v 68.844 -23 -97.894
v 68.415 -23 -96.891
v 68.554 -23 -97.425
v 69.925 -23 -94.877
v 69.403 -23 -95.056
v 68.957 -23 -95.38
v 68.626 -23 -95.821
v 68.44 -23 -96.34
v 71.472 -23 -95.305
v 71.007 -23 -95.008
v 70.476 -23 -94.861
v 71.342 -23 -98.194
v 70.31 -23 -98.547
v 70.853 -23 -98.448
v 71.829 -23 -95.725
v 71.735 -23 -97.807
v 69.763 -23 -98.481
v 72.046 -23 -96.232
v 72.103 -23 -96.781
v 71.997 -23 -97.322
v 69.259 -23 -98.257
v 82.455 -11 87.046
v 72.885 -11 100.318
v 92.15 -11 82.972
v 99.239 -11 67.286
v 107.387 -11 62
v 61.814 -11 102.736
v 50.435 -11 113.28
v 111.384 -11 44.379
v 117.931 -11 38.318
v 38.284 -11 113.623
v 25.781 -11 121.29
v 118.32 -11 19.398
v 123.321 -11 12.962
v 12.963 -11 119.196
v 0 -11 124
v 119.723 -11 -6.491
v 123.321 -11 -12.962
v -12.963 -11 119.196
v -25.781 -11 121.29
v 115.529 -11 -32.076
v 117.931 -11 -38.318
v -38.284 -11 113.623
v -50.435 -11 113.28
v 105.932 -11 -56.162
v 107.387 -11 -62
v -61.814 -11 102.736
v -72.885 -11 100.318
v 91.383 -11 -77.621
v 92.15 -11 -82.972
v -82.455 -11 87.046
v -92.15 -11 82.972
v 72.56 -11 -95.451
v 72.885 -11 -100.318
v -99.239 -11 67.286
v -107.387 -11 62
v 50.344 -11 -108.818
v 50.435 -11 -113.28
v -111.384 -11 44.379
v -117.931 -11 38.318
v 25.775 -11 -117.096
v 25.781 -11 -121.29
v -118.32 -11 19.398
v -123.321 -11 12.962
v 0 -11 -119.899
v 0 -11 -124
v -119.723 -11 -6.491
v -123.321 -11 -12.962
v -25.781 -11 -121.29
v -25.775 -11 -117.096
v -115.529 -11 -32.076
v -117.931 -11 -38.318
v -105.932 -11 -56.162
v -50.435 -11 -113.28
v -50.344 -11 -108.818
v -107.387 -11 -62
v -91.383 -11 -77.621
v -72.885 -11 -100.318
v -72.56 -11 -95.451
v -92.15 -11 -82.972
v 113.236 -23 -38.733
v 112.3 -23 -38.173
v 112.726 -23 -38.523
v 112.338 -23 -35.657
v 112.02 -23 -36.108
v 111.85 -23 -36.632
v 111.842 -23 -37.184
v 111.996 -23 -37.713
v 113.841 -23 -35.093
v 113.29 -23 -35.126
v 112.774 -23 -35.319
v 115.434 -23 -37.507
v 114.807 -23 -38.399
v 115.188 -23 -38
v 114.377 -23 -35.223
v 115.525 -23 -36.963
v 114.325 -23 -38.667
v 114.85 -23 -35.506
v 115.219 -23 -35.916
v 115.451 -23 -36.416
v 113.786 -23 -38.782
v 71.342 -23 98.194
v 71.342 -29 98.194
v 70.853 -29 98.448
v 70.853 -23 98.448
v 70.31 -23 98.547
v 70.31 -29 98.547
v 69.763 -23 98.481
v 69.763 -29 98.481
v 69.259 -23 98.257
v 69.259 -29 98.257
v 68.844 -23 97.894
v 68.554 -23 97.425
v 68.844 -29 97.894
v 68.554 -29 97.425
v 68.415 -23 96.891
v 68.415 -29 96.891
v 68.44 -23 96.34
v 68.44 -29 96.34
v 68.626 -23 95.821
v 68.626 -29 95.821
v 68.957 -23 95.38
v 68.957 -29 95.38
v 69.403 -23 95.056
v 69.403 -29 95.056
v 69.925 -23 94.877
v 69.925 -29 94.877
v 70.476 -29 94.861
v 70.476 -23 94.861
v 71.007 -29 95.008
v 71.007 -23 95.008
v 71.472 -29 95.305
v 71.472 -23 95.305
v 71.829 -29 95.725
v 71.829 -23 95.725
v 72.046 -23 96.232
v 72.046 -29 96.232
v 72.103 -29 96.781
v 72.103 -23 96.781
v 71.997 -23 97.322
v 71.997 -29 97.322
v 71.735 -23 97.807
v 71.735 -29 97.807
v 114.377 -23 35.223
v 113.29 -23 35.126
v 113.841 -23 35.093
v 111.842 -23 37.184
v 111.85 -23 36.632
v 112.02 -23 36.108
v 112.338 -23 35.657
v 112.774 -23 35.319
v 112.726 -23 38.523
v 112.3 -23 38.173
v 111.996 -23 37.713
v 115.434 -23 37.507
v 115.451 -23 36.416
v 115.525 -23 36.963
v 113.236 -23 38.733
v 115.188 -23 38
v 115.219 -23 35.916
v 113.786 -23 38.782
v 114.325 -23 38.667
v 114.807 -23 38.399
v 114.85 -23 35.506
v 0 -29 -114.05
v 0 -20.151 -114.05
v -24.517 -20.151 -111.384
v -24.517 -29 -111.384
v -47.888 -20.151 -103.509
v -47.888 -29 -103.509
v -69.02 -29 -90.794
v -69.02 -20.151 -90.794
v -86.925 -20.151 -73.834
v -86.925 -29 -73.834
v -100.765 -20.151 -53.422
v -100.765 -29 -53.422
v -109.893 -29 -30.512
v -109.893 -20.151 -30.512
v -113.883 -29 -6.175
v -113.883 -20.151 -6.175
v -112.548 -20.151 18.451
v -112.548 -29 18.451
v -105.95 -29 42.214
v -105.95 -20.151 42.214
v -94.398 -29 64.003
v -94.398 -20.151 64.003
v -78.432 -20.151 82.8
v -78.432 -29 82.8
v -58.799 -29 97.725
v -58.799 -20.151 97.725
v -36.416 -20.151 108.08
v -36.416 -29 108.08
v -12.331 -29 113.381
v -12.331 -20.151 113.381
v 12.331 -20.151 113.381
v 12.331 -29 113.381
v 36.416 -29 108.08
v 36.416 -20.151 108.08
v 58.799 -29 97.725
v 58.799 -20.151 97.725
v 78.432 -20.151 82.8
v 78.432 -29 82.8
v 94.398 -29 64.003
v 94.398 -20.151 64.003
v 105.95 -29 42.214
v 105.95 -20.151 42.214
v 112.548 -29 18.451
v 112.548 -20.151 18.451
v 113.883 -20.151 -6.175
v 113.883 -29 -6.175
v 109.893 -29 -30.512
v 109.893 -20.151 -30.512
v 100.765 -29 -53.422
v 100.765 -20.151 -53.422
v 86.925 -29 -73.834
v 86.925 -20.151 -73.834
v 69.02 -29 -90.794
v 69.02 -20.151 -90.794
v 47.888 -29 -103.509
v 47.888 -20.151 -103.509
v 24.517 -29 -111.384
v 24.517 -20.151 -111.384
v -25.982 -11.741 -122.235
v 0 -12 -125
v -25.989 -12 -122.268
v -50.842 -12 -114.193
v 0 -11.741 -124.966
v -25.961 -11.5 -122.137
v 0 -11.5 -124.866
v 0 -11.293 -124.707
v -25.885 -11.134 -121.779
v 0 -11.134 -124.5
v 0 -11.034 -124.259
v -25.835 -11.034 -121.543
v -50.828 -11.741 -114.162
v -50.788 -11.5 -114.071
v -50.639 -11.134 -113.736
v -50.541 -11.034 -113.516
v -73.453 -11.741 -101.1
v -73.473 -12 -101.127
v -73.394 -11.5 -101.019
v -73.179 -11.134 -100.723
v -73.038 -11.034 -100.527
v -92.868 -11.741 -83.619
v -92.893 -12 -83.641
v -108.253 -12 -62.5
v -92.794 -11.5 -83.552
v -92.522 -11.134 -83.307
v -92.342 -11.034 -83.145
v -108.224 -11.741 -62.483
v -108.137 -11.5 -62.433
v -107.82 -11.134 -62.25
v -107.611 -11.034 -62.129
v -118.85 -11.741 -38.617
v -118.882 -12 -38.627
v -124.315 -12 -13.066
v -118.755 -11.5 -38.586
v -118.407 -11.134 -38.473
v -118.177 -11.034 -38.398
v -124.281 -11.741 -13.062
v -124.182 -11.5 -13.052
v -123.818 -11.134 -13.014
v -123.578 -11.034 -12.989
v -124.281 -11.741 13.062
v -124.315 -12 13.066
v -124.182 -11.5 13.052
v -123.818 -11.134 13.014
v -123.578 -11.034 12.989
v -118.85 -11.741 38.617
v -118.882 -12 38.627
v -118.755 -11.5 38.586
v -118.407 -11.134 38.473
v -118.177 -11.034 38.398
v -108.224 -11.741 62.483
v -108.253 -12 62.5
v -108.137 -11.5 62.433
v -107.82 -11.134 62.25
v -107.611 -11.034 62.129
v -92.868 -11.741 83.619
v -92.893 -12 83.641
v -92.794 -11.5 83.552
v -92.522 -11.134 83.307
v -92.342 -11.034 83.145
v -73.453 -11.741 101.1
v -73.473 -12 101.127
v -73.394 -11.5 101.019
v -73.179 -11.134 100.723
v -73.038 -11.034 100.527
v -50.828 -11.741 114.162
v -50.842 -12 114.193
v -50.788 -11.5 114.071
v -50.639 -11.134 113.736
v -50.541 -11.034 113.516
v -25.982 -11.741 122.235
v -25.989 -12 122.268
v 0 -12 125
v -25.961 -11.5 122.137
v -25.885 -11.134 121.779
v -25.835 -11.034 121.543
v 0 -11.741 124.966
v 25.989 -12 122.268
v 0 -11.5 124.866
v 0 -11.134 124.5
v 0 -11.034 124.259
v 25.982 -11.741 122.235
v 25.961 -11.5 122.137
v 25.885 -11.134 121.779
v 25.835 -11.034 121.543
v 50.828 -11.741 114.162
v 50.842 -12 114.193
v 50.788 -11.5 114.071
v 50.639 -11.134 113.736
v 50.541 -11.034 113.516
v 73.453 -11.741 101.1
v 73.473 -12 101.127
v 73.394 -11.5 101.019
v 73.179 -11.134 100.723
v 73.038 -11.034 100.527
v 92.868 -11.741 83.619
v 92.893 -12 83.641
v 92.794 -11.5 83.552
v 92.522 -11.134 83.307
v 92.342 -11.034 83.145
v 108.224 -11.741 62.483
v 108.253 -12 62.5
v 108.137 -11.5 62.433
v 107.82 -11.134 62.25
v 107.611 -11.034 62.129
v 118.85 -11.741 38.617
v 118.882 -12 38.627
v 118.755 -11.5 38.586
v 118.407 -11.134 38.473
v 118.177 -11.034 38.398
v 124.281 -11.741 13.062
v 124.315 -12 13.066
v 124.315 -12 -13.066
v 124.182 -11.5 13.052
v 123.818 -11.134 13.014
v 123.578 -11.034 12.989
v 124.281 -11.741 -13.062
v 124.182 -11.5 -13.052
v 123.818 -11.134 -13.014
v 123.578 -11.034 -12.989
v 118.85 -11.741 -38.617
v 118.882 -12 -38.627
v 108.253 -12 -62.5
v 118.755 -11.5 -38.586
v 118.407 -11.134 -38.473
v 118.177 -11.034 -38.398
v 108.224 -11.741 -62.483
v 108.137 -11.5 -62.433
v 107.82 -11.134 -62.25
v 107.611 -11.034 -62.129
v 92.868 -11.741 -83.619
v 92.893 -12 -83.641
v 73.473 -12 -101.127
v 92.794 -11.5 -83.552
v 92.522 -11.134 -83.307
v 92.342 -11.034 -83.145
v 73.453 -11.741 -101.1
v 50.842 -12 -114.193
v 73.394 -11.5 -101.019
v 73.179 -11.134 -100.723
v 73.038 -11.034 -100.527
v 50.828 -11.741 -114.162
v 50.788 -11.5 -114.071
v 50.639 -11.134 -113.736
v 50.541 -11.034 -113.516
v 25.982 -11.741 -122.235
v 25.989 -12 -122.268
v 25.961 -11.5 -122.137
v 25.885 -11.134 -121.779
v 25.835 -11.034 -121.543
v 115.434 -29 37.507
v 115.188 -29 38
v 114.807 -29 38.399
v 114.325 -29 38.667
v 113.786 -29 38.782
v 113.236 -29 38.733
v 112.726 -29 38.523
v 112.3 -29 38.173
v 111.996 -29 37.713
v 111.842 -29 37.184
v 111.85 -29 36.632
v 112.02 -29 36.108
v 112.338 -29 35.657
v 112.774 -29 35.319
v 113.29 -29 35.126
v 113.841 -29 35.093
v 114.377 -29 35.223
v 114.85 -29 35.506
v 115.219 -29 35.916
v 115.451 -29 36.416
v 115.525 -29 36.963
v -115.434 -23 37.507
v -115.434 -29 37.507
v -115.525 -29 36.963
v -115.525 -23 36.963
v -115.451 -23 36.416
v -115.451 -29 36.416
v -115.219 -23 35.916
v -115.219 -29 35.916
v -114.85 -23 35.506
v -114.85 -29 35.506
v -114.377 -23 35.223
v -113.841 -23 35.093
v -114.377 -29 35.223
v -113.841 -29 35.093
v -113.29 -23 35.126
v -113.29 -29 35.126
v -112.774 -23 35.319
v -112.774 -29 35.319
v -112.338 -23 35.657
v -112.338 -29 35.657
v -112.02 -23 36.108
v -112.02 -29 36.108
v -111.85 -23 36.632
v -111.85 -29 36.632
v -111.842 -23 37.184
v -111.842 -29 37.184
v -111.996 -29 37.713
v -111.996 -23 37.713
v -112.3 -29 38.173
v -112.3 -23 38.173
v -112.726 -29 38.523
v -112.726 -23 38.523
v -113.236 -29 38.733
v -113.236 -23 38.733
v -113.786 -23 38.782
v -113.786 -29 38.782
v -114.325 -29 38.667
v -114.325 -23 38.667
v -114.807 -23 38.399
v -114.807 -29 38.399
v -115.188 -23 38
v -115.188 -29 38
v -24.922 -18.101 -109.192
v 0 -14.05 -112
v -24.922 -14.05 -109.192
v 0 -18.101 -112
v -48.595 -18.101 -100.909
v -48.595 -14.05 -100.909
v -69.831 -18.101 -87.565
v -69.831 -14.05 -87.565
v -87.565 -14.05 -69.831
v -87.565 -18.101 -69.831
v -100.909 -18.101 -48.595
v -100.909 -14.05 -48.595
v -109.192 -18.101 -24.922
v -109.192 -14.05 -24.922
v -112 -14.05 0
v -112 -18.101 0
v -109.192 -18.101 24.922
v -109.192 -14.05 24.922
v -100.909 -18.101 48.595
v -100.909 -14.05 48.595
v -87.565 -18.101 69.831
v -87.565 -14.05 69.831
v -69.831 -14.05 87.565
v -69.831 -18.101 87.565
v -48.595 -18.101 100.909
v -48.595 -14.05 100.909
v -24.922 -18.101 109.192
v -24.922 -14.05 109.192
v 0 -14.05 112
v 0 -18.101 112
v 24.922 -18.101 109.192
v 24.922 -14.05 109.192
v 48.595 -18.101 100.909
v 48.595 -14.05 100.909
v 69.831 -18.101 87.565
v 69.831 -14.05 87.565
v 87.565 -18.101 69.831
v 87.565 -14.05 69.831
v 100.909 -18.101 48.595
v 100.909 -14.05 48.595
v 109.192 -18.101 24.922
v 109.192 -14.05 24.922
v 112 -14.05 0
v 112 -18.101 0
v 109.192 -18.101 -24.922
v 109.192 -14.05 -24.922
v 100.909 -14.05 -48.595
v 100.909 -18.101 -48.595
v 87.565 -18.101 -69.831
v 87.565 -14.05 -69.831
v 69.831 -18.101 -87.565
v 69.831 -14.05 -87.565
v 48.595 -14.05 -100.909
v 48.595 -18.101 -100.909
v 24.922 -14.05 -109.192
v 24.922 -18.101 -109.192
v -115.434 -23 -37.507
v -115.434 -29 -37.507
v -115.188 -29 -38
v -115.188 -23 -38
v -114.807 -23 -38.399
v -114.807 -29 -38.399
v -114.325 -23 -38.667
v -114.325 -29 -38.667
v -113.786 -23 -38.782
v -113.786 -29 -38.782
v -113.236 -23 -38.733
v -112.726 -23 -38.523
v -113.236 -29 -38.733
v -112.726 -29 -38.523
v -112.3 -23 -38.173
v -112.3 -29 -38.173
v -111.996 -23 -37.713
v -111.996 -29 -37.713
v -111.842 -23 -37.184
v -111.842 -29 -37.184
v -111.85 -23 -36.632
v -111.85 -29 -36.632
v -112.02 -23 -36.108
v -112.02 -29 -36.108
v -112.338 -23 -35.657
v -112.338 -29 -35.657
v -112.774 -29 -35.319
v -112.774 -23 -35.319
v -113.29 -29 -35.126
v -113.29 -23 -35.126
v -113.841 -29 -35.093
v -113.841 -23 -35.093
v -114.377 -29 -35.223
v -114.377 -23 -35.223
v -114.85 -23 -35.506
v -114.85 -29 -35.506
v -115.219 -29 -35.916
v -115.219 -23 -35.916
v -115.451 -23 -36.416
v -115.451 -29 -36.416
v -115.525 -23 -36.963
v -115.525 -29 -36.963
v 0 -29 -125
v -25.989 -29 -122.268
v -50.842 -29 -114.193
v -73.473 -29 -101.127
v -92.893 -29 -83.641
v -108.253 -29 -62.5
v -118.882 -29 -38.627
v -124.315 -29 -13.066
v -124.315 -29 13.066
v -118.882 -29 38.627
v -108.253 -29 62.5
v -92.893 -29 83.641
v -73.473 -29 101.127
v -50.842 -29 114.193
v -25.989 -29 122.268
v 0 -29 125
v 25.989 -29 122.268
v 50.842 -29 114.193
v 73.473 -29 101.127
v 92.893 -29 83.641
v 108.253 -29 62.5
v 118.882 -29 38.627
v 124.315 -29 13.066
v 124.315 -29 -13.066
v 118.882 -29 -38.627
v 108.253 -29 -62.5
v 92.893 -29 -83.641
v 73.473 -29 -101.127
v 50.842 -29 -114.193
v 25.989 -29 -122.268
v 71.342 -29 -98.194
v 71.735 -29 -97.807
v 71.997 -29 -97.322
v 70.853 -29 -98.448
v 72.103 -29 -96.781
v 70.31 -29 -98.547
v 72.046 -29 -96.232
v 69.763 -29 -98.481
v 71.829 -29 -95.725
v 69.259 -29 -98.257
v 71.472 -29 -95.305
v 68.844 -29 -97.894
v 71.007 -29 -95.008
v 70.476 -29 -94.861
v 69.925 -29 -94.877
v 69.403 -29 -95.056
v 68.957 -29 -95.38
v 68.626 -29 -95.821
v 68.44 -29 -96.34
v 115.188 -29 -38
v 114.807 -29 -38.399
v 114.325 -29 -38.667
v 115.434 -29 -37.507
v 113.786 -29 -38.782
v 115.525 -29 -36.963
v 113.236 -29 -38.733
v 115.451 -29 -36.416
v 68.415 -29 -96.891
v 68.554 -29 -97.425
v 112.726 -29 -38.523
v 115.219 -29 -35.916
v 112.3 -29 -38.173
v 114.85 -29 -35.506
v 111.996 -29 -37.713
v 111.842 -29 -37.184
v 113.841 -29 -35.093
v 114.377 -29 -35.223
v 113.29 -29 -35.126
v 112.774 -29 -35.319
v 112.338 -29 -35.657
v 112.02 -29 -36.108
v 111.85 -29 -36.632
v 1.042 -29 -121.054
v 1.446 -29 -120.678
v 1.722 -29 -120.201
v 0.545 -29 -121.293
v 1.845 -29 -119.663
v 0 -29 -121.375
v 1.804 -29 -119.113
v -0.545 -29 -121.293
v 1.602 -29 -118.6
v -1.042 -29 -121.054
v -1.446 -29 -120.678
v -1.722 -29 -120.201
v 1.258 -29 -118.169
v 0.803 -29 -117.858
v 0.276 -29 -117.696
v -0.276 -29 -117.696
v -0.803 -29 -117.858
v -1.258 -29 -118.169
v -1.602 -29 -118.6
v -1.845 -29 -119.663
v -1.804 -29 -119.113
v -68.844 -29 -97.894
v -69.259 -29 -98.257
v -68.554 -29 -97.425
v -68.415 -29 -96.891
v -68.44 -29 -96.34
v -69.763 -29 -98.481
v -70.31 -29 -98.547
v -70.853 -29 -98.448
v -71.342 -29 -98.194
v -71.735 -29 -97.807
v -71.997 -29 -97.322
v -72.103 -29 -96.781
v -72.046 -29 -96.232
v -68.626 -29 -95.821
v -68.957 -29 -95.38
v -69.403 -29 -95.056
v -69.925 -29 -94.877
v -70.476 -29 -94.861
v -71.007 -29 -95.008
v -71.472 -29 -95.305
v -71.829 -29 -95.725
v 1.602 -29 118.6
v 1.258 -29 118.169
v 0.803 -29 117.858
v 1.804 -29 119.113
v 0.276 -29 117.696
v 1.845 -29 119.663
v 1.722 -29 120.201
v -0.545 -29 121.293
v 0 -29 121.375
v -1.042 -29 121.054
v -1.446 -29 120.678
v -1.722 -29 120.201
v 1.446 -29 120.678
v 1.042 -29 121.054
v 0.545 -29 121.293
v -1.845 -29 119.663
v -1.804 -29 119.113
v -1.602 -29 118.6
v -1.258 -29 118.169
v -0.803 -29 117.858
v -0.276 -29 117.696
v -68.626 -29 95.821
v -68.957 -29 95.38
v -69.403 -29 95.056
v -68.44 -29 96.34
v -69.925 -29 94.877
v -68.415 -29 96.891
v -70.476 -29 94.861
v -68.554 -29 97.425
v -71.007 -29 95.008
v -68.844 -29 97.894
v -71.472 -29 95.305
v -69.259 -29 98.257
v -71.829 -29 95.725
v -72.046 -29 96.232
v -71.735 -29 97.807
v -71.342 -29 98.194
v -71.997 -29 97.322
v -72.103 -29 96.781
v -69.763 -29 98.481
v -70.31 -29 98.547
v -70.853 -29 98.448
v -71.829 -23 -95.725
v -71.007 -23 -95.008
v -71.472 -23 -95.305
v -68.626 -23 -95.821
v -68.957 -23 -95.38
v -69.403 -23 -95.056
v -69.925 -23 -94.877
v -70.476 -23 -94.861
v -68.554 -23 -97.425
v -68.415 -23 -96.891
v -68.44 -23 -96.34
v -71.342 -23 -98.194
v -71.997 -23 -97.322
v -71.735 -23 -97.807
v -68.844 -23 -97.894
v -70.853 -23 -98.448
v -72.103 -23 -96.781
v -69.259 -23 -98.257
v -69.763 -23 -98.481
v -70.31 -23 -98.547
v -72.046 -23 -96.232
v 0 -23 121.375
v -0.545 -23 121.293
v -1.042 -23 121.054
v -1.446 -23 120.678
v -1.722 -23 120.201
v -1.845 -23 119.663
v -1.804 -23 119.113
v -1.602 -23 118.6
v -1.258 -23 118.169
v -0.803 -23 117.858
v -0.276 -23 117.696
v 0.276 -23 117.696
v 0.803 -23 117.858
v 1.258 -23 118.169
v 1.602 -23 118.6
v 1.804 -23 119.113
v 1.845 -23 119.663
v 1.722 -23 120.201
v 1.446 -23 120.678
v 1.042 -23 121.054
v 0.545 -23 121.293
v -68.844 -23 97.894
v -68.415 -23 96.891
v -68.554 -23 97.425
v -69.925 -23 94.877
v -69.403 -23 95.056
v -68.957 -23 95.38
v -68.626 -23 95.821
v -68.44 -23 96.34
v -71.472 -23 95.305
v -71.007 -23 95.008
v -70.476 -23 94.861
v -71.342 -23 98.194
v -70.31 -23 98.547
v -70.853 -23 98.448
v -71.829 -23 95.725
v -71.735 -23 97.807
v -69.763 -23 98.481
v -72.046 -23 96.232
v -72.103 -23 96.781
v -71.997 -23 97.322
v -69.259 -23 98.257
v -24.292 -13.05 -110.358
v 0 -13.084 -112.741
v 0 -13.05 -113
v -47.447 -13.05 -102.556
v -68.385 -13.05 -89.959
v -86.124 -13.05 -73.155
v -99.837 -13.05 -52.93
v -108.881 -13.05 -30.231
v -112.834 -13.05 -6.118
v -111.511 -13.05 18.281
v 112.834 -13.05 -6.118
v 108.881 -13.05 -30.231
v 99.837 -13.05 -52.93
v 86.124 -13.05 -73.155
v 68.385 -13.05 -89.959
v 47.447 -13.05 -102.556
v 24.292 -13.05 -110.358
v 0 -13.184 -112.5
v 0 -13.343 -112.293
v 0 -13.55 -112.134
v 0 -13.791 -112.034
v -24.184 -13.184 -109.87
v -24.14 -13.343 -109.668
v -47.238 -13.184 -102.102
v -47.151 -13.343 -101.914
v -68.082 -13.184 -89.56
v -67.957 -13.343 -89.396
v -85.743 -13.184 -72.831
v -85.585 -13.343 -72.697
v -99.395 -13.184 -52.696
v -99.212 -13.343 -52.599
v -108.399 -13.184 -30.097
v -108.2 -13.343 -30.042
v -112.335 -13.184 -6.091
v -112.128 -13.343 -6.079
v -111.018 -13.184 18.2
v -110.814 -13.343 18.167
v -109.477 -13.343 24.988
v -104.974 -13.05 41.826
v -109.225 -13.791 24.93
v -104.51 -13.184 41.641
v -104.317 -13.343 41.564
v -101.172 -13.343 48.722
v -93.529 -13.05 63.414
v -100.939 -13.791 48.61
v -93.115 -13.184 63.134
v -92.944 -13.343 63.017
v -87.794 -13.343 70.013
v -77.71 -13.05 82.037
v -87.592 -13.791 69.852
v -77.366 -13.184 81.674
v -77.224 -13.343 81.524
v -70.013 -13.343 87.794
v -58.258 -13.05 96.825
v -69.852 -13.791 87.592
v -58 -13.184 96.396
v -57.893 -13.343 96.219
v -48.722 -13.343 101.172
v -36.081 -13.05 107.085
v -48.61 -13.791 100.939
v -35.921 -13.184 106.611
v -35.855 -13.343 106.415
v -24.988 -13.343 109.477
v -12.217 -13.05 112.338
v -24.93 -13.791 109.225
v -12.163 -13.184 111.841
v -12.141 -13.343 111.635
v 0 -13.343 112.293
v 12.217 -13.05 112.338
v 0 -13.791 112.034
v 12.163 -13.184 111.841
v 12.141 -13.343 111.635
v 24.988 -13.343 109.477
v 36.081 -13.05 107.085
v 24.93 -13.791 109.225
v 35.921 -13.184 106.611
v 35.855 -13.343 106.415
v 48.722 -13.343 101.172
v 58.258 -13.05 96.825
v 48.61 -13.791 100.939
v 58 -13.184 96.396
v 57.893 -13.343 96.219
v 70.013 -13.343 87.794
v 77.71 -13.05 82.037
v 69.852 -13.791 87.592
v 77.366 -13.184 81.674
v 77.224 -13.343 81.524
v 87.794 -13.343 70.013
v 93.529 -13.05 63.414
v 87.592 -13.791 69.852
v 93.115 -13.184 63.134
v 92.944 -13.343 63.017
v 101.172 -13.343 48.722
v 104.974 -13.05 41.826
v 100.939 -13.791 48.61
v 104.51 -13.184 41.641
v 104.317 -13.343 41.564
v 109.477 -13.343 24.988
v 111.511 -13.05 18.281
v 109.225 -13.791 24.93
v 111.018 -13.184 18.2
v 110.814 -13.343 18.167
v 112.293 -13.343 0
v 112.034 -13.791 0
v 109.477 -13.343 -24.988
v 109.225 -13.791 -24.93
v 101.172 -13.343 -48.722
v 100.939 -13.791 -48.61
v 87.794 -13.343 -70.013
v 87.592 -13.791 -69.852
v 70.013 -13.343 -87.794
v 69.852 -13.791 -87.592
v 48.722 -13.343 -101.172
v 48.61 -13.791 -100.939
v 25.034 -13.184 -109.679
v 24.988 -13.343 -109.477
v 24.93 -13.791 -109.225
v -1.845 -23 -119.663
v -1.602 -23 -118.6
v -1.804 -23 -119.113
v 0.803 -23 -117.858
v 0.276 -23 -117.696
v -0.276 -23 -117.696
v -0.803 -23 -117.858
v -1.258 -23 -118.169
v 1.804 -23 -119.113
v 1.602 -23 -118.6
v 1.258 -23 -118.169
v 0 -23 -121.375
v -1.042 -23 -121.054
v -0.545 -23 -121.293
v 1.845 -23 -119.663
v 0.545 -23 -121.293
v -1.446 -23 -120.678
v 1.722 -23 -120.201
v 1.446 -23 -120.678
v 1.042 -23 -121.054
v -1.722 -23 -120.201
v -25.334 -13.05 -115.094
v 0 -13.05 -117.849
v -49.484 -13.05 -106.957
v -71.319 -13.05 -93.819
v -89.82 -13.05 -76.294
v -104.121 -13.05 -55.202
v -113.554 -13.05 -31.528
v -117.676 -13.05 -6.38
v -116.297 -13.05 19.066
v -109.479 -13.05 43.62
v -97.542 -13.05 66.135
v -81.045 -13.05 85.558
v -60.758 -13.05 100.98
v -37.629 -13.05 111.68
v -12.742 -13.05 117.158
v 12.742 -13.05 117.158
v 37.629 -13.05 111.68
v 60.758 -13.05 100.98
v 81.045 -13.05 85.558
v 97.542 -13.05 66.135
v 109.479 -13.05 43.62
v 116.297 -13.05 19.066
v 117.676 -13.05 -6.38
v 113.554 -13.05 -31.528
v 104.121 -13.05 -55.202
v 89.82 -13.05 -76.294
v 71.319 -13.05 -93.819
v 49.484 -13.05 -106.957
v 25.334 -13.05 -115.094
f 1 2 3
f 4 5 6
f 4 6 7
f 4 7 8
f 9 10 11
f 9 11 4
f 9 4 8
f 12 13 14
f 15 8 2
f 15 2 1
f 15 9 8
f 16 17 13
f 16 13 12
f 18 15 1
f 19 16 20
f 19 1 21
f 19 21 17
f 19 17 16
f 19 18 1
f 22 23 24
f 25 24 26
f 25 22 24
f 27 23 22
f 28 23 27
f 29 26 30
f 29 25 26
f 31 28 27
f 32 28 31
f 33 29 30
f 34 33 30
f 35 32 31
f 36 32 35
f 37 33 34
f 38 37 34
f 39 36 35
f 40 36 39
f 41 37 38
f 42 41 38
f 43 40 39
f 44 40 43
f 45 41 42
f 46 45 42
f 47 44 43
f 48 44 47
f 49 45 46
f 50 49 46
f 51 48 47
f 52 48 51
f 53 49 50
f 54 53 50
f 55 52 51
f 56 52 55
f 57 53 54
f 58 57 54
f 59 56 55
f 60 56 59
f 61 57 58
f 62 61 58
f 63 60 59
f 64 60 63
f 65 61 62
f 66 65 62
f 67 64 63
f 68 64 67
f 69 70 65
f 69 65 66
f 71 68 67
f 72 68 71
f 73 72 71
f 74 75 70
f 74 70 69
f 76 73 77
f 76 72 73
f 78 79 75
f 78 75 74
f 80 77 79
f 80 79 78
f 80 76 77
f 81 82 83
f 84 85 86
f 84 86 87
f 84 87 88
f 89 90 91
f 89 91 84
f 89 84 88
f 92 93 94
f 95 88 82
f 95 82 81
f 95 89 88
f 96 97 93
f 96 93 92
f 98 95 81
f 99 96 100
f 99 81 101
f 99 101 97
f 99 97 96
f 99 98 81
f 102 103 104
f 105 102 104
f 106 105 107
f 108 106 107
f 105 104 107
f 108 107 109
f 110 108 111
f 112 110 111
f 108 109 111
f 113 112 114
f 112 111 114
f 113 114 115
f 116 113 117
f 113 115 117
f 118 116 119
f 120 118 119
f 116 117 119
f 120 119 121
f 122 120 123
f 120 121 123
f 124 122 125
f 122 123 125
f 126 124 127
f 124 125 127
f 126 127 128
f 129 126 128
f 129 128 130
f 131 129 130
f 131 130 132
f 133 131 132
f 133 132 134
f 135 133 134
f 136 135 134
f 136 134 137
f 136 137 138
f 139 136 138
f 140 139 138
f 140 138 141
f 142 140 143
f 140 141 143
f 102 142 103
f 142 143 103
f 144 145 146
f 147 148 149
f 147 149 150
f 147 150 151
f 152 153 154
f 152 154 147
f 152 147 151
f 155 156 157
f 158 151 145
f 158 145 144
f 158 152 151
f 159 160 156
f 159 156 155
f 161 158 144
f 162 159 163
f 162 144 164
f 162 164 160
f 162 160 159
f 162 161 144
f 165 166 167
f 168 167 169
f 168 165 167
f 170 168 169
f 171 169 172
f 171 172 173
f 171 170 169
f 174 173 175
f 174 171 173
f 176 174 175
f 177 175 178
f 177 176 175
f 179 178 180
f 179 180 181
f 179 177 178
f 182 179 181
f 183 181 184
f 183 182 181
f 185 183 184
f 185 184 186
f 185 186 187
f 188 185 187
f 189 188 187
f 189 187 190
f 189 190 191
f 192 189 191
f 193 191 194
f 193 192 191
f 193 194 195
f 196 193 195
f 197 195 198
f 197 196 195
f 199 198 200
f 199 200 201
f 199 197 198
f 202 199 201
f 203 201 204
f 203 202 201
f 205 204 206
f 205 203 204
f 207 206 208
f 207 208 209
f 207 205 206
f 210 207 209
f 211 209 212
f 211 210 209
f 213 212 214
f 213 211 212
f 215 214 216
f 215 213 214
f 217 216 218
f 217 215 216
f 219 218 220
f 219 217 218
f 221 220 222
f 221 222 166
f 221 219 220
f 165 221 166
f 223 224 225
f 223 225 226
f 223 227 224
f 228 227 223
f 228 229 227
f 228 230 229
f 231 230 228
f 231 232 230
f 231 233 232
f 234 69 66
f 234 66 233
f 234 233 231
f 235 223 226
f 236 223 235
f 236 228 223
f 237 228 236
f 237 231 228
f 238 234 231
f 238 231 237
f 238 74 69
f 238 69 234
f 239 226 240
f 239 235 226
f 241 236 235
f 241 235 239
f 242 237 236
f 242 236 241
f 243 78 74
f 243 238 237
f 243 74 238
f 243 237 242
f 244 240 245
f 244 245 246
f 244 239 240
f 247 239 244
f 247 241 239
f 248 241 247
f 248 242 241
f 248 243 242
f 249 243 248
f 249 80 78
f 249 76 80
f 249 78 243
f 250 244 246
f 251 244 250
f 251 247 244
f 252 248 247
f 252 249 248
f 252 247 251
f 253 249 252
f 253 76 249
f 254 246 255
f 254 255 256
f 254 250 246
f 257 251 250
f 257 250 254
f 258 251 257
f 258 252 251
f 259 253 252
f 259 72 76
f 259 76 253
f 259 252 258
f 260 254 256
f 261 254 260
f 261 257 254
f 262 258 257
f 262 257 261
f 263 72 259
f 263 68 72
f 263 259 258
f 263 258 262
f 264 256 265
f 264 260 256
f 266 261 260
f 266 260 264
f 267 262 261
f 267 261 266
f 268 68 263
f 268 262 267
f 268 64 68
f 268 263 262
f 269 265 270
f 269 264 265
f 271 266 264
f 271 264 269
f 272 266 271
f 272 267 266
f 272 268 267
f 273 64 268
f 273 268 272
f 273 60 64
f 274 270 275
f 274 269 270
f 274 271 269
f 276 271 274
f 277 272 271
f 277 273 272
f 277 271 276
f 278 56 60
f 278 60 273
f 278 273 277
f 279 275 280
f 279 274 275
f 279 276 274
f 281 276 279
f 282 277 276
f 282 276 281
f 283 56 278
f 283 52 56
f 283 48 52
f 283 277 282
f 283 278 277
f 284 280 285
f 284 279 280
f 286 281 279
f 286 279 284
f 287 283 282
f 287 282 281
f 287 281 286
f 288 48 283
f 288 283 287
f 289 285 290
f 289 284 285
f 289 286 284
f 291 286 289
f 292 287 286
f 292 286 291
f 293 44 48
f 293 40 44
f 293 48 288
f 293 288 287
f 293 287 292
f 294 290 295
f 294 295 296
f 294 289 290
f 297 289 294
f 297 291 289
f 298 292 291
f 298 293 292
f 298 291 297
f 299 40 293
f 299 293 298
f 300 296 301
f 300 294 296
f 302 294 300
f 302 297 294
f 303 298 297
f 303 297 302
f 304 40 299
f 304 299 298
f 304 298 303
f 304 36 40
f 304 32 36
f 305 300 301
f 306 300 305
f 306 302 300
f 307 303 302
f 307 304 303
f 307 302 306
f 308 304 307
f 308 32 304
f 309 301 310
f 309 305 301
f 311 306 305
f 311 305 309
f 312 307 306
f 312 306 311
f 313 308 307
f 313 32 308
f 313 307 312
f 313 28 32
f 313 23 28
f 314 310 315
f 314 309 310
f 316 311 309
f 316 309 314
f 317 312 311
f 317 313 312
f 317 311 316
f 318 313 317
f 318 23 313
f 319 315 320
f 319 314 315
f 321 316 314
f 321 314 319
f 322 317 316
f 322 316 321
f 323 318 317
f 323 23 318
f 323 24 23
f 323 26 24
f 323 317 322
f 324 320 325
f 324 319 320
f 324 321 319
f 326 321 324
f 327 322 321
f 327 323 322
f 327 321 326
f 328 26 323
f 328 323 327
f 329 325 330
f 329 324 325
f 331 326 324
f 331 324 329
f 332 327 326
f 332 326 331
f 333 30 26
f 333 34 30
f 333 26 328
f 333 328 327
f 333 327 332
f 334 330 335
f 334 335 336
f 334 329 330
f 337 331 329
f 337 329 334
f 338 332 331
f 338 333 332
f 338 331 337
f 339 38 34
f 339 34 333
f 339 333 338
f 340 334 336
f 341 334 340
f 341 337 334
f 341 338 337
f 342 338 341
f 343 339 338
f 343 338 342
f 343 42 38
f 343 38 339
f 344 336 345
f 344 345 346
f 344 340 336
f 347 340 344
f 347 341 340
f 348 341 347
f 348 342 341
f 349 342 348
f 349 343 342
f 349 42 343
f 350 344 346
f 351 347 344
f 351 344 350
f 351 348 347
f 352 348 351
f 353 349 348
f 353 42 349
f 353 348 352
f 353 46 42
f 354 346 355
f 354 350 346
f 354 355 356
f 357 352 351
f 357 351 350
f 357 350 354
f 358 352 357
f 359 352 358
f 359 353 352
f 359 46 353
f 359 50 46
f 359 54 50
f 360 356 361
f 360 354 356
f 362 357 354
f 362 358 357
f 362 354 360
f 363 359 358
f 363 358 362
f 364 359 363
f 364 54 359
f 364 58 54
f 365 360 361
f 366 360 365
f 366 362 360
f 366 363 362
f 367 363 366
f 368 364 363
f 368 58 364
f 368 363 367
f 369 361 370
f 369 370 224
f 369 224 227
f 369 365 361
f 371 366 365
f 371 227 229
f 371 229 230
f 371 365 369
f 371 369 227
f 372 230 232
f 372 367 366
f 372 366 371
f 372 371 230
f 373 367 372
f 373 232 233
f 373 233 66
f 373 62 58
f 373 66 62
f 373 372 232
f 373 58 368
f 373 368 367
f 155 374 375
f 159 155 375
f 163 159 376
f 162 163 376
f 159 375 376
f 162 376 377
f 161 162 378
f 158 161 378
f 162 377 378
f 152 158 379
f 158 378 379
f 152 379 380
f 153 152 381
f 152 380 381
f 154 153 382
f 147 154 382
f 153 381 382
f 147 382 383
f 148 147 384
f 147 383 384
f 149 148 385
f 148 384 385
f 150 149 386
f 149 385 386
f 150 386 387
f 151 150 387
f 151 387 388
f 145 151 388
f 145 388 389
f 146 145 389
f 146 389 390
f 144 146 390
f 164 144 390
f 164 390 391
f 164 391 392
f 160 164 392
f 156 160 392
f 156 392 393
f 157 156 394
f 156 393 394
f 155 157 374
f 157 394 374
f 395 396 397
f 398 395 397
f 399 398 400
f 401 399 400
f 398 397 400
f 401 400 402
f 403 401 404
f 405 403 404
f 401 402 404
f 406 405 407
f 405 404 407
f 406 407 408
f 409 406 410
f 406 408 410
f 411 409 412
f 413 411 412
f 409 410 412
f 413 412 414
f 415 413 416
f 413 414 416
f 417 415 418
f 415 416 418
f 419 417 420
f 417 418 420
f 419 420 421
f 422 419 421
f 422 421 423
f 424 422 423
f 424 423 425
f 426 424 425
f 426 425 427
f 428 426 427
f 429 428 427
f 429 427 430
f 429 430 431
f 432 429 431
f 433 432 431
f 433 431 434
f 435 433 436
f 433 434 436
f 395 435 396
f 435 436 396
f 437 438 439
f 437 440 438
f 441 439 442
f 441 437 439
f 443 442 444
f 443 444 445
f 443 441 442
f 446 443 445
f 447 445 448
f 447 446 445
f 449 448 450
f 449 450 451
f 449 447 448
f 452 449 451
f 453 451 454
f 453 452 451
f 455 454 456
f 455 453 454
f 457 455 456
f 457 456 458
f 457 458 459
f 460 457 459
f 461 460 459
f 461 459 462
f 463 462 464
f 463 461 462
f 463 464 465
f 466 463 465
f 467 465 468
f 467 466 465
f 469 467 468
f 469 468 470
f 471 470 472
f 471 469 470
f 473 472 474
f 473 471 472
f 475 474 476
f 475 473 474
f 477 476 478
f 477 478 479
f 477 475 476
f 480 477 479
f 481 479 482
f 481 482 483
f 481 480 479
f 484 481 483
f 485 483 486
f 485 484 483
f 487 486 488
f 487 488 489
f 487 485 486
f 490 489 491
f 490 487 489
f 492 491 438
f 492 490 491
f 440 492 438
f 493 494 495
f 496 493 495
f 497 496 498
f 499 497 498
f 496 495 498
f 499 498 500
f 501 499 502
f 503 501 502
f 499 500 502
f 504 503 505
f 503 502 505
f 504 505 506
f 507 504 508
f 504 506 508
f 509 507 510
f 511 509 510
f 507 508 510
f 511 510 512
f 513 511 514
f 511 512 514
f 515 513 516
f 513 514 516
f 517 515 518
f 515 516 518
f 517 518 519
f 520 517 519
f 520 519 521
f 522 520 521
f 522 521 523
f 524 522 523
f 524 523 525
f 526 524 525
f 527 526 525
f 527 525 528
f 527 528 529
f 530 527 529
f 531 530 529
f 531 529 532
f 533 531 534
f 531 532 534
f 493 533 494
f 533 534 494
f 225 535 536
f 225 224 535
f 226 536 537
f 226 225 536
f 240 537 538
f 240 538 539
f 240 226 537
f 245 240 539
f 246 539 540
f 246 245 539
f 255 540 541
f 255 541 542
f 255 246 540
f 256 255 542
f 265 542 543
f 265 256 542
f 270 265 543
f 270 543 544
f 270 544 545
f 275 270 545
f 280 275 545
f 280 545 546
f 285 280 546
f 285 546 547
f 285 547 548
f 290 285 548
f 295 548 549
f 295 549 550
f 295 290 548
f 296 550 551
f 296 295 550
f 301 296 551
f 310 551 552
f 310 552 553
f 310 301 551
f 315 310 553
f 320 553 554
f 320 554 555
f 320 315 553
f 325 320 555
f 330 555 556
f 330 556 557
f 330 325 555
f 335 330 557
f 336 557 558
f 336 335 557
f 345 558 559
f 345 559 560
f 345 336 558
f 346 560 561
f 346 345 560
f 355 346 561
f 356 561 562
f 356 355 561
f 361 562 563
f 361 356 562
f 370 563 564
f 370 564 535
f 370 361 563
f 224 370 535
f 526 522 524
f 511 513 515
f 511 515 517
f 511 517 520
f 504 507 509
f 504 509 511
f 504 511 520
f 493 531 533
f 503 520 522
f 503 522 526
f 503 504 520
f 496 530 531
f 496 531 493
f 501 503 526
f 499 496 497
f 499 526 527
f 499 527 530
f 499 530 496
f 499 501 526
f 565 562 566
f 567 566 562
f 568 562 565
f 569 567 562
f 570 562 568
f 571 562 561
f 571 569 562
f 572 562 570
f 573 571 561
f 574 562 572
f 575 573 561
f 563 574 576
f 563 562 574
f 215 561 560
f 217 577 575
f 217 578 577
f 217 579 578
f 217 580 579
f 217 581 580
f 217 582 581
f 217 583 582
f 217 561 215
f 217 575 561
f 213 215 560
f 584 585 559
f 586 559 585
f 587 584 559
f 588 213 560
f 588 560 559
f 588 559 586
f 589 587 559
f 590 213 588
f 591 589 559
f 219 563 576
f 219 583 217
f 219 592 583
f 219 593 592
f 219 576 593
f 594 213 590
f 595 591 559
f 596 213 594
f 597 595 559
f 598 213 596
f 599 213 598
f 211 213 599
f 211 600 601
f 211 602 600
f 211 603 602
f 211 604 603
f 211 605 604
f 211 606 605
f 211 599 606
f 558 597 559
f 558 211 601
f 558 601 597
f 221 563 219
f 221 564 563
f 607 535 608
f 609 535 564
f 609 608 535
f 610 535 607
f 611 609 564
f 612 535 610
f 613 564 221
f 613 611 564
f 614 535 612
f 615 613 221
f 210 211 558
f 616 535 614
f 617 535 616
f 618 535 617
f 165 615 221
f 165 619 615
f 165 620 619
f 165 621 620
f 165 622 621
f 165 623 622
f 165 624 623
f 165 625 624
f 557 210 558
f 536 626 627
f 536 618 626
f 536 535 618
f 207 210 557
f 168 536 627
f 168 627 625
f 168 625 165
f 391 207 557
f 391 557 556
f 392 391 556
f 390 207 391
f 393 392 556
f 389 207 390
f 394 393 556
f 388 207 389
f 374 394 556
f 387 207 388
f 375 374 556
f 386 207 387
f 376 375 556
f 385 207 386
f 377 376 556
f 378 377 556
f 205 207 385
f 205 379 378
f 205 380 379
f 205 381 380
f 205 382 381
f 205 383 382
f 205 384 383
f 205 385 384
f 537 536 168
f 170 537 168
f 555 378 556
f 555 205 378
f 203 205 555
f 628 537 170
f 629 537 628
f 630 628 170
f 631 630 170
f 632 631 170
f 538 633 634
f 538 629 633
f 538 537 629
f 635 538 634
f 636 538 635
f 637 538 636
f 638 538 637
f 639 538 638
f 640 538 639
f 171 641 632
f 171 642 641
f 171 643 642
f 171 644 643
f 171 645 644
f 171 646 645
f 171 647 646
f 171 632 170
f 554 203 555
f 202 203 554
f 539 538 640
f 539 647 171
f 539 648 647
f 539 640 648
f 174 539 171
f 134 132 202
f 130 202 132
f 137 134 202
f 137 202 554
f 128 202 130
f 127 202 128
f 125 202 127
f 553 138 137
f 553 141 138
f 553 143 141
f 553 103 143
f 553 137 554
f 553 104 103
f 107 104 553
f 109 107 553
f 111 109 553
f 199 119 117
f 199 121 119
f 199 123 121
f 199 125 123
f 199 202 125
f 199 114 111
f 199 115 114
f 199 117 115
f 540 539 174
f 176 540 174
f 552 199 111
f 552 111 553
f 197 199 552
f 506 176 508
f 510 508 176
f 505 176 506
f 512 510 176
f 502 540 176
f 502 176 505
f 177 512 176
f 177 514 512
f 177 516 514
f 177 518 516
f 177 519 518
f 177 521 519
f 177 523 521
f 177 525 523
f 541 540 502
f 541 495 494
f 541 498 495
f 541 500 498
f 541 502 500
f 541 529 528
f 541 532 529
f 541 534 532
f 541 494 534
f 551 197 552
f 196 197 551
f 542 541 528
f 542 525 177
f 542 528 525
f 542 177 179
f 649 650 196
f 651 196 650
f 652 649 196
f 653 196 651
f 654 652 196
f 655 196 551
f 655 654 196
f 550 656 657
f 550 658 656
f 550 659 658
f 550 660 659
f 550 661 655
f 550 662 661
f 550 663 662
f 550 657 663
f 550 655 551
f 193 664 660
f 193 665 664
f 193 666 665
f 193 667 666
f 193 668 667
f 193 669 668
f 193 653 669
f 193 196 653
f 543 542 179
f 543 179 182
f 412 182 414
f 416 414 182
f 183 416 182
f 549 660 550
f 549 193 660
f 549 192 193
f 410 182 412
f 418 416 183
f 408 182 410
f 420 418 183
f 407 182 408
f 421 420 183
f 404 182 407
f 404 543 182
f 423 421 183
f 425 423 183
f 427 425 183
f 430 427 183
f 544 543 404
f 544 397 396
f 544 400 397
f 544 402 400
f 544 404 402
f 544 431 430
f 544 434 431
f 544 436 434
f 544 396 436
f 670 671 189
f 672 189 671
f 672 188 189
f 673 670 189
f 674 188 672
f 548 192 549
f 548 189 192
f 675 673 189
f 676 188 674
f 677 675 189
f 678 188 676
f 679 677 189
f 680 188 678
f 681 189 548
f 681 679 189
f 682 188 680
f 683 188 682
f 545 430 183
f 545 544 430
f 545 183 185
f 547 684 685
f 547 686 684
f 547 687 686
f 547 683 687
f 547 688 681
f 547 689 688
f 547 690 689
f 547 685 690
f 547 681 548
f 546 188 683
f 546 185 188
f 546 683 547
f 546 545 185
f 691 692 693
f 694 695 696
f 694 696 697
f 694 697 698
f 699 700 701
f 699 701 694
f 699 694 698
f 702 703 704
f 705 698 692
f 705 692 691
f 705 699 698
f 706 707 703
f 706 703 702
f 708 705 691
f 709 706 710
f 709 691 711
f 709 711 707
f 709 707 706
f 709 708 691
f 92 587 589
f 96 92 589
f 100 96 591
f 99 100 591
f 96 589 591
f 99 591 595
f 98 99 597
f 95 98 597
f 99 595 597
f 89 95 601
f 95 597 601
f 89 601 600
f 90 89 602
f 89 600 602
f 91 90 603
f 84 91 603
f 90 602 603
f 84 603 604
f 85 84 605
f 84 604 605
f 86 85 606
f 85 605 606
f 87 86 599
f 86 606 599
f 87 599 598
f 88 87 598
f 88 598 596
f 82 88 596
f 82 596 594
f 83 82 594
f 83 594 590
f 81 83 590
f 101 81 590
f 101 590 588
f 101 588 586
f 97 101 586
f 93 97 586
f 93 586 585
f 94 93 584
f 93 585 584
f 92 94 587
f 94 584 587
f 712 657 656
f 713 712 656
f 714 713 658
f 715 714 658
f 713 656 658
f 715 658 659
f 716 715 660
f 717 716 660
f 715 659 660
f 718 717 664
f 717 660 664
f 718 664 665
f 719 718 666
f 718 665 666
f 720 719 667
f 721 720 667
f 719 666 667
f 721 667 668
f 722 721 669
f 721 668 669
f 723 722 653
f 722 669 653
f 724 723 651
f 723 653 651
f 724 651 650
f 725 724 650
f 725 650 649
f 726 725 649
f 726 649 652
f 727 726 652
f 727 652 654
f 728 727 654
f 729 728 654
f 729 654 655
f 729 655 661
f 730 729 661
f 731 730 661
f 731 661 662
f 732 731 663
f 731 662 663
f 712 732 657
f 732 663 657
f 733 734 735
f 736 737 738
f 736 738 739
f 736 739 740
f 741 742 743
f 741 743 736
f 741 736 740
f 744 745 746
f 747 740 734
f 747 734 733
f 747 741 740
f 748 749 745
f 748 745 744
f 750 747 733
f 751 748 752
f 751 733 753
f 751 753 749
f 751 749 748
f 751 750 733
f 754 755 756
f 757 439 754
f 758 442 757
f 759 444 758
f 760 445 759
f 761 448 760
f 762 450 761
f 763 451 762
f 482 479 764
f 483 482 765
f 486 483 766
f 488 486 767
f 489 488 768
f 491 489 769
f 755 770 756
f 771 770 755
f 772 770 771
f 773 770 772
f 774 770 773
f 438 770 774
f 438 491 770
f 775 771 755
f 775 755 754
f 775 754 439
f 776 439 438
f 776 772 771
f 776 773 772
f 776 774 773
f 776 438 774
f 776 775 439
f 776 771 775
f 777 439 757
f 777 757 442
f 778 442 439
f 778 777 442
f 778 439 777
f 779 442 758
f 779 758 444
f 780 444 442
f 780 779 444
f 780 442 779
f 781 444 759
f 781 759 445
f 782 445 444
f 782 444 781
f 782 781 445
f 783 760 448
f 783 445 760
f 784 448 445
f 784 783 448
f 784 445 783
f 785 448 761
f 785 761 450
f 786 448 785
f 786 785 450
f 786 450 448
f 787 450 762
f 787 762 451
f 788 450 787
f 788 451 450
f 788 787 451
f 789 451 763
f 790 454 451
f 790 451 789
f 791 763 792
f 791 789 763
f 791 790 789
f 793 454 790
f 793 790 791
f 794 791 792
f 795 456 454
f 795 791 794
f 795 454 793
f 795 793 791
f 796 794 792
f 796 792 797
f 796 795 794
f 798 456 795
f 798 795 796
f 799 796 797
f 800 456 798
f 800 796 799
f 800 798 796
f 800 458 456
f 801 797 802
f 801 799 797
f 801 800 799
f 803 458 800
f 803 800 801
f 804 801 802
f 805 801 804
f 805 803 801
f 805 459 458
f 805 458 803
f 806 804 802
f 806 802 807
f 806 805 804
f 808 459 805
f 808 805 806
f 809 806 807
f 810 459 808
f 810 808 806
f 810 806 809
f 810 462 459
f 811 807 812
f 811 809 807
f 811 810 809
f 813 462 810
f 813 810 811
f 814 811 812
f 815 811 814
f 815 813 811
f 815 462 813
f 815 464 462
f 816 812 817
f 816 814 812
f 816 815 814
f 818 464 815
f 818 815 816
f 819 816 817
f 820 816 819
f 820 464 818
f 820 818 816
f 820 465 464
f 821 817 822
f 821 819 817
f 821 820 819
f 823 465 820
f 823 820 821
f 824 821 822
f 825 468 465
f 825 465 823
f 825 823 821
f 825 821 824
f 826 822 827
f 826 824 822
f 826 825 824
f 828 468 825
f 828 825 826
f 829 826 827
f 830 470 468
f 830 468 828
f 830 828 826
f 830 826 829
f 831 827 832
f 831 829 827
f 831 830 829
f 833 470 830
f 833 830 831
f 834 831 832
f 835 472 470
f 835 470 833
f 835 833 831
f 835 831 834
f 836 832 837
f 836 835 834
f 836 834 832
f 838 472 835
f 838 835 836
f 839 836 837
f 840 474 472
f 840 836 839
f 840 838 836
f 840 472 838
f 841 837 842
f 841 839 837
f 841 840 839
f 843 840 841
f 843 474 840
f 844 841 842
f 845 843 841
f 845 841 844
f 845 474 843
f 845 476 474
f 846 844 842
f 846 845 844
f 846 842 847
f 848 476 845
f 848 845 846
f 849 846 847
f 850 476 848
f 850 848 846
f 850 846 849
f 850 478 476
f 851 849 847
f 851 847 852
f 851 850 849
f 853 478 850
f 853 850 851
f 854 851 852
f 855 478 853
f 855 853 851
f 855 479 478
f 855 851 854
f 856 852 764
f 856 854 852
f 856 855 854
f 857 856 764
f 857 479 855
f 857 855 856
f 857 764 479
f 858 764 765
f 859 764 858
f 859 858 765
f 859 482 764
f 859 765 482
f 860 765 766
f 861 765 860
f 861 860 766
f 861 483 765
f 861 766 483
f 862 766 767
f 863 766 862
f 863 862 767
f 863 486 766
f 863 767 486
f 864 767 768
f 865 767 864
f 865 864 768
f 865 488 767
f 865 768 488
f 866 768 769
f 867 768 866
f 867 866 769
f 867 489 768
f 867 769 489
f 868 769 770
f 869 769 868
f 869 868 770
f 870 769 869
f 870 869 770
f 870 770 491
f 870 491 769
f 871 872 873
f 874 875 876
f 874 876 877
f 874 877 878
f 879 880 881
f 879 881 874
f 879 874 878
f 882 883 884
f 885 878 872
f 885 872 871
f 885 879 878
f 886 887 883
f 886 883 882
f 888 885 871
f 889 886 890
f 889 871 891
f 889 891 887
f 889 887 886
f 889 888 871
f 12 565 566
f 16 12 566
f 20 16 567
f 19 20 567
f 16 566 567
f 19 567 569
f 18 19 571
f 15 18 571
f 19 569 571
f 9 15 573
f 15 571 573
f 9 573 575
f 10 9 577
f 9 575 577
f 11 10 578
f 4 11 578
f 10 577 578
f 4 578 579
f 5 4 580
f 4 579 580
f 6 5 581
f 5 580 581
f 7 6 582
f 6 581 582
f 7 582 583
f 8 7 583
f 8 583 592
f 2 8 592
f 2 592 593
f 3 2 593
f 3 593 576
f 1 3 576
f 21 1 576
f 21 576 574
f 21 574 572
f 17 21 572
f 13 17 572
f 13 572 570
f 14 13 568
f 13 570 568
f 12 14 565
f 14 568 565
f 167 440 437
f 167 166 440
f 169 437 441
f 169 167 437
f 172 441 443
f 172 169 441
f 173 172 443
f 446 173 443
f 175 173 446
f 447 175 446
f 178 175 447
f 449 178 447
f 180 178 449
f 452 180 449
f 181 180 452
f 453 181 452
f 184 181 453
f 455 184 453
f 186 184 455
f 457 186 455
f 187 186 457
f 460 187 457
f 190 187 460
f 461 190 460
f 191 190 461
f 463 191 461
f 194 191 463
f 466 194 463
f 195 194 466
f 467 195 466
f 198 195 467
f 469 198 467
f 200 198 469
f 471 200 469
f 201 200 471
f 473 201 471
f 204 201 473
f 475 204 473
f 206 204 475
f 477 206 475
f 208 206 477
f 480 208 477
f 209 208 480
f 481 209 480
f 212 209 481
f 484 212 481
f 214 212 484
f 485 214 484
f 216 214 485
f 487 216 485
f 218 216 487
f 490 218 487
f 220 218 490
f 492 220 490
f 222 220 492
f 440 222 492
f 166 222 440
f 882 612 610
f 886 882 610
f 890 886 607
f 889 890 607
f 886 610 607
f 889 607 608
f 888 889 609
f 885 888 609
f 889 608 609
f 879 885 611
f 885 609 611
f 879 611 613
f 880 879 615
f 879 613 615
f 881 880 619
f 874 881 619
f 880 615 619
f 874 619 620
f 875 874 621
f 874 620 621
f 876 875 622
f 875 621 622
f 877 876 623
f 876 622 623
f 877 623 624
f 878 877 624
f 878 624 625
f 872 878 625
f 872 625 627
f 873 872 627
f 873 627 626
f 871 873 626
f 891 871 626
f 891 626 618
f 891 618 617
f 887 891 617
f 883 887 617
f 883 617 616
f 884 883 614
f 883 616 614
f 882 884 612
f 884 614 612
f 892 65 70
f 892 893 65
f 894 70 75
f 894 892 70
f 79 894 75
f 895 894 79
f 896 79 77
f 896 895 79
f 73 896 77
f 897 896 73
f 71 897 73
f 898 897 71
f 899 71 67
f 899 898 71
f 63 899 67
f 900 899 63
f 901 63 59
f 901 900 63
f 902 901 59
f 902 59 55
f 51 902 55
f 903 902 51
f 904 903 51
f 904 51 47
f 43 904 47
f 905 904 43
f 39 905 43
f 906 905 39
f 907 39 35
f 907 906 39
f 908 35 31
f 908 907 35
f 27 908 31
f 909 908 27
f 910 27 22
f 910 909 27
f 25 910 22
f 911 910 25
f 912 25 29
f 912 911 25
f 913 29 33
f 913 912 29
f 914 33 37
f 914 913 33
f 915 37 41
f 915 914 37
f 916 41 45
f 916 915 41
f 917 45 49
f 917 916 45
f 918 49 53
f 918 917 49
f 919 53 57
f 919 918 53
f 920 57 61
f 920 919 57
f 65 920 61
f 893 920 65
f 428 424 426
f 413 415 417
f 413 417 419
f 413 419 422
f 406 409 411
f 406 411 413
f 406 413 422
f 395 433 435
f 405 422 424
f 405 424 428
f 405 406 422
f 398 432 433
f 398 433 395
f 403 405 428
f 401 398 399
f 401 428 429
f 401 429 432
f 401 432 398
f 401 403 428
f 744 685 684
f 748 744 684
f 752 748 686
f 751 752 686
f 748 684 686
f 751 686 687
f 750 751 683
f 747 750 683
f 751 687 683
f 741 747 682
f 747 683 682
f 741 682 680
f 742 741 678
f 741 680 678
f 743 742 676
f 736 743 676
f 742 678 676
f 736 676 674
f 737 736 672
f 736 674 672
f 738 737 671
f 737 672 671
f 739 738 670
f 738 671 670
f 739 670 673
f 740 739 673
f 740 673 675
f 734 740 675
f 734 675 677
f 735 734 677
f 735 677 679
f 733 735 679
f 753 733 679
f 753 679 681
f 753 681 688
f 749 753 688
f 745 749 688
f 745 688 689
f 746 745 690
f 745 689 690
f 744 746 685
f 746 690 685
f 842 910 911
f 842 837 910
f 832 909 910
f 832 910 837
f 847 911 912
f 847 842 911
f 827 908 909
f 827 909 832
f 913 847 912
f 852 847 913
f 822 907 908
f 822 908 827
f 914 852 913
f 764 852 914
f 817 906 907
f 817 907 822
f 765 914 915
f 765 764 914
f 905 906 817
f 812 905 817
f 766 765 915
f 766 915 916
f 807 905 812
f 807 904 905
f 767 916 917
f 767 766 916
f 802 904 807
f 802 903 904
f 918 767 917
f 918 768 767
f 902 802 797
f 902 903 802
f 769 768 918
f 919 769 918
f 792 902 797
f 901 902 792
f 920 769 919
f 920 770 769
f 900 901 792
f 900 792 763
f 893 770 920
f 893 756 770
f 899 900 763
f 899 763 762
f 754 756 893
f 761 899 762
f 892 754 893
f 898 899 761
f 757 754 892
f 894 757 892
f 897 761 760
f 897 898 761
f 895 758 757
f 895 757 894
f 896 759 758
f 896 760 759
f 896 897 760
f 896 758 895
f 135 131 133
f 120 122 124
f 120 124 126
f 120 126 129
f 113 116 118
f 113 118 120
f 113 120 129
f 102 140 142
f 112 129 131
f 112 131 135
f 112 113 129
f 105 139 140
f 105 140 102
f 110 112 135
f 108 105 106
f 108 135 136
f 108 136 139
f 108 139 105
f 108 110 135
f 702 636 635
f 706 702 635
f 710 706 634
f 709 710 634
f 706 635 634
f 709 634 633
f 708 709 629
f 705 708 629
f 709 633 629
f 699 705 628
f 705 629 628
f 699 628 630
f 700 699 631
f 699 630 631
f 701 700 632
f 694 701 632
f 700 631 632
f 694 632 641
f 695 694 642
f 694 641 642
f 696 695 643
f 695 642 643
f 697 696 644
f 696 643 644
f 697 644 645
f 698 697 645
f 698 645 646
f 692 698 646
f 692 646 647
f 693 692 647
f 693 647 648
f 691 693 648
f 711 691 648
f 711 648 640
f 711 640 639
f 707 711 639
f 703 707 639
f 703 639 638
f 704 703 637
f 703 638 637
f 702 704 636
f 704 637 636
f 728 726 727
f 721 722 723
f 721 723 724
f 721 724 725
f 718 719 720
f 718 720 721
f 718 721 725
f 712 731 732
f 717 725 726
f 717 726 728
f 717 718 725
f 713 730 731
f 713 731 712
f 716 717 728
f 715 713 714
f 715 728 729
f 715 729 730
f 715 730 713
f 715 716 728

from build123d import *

# Parameters (mm, degrees)
SKETCH4_R          = 1.85
CUT_EXTRUDE1_DEPTH = 6
CIRPATTERN1_COUNT  = 10


with BuildPart() as part:
    # Sketch3 (on Front Plane) → Revolve2 (revolve)
    with BuildSketch(Plane.XY, mode=Mode.PRIVATE) as revolve2_sk:
        with BuildLine():
            Line((-117.849137803, -13.05), (-113, -13.05))
            ThreePointArc((-113, -13.05), (-112.292893219, -13.342893219), (-112, -14.05))
            Line((-112, -14.05), (-112, -18.100862197))
            Line((-112, -18.100862197), (-114.05, -20.150862197))
            Line((-114.05, -20.150862197), (-114.05, -29))
            Line((-114.05, -29), (-125, -29))
            Line((-125, -29), (-125, -12))
            ThreePointArc((-125, -12), (-124.707106781, -11.292893219), (-124, -11))
            Line((-124, -11), (-119.899137803, -11))
            Line((-119.899137803, -11), (-117.849137803, -13.05))
        make_face()
    revolve(revolve2_sk.sketch.rotate(Axis((0, 0, 0), (0, 1, 0)), 270), axis=Axis((0, 0, 0), (0, 1, 0)))

    # Sketch4 → Cut-Extrude1 (cut)
    with BuildSketch(Plane.XZ.offset(29)):
        with Locations(Location((0, -119.525, 0), (0, 0, 270))):
            Circle(SKETCH4_R)
    cut_extrude1 = extrude(amount=-CUT_EXTRUDE1_DEPTH, mode=Mode.SUBTRACT)

    # CirPattern1: Cut-Extrude1 ×10 about axis
    cirpattern1_axis = Axis((0, 0, 0), (0, 1, 0))
    for i in range(1, CIRPATTERN1_COUNT):
        add(cut_extrude1.rotate(cirpattern1_axis, i * 360 / CIRPATTERN1_COUNT), mode=Mode.SUBTRACT)


solid = part.part
